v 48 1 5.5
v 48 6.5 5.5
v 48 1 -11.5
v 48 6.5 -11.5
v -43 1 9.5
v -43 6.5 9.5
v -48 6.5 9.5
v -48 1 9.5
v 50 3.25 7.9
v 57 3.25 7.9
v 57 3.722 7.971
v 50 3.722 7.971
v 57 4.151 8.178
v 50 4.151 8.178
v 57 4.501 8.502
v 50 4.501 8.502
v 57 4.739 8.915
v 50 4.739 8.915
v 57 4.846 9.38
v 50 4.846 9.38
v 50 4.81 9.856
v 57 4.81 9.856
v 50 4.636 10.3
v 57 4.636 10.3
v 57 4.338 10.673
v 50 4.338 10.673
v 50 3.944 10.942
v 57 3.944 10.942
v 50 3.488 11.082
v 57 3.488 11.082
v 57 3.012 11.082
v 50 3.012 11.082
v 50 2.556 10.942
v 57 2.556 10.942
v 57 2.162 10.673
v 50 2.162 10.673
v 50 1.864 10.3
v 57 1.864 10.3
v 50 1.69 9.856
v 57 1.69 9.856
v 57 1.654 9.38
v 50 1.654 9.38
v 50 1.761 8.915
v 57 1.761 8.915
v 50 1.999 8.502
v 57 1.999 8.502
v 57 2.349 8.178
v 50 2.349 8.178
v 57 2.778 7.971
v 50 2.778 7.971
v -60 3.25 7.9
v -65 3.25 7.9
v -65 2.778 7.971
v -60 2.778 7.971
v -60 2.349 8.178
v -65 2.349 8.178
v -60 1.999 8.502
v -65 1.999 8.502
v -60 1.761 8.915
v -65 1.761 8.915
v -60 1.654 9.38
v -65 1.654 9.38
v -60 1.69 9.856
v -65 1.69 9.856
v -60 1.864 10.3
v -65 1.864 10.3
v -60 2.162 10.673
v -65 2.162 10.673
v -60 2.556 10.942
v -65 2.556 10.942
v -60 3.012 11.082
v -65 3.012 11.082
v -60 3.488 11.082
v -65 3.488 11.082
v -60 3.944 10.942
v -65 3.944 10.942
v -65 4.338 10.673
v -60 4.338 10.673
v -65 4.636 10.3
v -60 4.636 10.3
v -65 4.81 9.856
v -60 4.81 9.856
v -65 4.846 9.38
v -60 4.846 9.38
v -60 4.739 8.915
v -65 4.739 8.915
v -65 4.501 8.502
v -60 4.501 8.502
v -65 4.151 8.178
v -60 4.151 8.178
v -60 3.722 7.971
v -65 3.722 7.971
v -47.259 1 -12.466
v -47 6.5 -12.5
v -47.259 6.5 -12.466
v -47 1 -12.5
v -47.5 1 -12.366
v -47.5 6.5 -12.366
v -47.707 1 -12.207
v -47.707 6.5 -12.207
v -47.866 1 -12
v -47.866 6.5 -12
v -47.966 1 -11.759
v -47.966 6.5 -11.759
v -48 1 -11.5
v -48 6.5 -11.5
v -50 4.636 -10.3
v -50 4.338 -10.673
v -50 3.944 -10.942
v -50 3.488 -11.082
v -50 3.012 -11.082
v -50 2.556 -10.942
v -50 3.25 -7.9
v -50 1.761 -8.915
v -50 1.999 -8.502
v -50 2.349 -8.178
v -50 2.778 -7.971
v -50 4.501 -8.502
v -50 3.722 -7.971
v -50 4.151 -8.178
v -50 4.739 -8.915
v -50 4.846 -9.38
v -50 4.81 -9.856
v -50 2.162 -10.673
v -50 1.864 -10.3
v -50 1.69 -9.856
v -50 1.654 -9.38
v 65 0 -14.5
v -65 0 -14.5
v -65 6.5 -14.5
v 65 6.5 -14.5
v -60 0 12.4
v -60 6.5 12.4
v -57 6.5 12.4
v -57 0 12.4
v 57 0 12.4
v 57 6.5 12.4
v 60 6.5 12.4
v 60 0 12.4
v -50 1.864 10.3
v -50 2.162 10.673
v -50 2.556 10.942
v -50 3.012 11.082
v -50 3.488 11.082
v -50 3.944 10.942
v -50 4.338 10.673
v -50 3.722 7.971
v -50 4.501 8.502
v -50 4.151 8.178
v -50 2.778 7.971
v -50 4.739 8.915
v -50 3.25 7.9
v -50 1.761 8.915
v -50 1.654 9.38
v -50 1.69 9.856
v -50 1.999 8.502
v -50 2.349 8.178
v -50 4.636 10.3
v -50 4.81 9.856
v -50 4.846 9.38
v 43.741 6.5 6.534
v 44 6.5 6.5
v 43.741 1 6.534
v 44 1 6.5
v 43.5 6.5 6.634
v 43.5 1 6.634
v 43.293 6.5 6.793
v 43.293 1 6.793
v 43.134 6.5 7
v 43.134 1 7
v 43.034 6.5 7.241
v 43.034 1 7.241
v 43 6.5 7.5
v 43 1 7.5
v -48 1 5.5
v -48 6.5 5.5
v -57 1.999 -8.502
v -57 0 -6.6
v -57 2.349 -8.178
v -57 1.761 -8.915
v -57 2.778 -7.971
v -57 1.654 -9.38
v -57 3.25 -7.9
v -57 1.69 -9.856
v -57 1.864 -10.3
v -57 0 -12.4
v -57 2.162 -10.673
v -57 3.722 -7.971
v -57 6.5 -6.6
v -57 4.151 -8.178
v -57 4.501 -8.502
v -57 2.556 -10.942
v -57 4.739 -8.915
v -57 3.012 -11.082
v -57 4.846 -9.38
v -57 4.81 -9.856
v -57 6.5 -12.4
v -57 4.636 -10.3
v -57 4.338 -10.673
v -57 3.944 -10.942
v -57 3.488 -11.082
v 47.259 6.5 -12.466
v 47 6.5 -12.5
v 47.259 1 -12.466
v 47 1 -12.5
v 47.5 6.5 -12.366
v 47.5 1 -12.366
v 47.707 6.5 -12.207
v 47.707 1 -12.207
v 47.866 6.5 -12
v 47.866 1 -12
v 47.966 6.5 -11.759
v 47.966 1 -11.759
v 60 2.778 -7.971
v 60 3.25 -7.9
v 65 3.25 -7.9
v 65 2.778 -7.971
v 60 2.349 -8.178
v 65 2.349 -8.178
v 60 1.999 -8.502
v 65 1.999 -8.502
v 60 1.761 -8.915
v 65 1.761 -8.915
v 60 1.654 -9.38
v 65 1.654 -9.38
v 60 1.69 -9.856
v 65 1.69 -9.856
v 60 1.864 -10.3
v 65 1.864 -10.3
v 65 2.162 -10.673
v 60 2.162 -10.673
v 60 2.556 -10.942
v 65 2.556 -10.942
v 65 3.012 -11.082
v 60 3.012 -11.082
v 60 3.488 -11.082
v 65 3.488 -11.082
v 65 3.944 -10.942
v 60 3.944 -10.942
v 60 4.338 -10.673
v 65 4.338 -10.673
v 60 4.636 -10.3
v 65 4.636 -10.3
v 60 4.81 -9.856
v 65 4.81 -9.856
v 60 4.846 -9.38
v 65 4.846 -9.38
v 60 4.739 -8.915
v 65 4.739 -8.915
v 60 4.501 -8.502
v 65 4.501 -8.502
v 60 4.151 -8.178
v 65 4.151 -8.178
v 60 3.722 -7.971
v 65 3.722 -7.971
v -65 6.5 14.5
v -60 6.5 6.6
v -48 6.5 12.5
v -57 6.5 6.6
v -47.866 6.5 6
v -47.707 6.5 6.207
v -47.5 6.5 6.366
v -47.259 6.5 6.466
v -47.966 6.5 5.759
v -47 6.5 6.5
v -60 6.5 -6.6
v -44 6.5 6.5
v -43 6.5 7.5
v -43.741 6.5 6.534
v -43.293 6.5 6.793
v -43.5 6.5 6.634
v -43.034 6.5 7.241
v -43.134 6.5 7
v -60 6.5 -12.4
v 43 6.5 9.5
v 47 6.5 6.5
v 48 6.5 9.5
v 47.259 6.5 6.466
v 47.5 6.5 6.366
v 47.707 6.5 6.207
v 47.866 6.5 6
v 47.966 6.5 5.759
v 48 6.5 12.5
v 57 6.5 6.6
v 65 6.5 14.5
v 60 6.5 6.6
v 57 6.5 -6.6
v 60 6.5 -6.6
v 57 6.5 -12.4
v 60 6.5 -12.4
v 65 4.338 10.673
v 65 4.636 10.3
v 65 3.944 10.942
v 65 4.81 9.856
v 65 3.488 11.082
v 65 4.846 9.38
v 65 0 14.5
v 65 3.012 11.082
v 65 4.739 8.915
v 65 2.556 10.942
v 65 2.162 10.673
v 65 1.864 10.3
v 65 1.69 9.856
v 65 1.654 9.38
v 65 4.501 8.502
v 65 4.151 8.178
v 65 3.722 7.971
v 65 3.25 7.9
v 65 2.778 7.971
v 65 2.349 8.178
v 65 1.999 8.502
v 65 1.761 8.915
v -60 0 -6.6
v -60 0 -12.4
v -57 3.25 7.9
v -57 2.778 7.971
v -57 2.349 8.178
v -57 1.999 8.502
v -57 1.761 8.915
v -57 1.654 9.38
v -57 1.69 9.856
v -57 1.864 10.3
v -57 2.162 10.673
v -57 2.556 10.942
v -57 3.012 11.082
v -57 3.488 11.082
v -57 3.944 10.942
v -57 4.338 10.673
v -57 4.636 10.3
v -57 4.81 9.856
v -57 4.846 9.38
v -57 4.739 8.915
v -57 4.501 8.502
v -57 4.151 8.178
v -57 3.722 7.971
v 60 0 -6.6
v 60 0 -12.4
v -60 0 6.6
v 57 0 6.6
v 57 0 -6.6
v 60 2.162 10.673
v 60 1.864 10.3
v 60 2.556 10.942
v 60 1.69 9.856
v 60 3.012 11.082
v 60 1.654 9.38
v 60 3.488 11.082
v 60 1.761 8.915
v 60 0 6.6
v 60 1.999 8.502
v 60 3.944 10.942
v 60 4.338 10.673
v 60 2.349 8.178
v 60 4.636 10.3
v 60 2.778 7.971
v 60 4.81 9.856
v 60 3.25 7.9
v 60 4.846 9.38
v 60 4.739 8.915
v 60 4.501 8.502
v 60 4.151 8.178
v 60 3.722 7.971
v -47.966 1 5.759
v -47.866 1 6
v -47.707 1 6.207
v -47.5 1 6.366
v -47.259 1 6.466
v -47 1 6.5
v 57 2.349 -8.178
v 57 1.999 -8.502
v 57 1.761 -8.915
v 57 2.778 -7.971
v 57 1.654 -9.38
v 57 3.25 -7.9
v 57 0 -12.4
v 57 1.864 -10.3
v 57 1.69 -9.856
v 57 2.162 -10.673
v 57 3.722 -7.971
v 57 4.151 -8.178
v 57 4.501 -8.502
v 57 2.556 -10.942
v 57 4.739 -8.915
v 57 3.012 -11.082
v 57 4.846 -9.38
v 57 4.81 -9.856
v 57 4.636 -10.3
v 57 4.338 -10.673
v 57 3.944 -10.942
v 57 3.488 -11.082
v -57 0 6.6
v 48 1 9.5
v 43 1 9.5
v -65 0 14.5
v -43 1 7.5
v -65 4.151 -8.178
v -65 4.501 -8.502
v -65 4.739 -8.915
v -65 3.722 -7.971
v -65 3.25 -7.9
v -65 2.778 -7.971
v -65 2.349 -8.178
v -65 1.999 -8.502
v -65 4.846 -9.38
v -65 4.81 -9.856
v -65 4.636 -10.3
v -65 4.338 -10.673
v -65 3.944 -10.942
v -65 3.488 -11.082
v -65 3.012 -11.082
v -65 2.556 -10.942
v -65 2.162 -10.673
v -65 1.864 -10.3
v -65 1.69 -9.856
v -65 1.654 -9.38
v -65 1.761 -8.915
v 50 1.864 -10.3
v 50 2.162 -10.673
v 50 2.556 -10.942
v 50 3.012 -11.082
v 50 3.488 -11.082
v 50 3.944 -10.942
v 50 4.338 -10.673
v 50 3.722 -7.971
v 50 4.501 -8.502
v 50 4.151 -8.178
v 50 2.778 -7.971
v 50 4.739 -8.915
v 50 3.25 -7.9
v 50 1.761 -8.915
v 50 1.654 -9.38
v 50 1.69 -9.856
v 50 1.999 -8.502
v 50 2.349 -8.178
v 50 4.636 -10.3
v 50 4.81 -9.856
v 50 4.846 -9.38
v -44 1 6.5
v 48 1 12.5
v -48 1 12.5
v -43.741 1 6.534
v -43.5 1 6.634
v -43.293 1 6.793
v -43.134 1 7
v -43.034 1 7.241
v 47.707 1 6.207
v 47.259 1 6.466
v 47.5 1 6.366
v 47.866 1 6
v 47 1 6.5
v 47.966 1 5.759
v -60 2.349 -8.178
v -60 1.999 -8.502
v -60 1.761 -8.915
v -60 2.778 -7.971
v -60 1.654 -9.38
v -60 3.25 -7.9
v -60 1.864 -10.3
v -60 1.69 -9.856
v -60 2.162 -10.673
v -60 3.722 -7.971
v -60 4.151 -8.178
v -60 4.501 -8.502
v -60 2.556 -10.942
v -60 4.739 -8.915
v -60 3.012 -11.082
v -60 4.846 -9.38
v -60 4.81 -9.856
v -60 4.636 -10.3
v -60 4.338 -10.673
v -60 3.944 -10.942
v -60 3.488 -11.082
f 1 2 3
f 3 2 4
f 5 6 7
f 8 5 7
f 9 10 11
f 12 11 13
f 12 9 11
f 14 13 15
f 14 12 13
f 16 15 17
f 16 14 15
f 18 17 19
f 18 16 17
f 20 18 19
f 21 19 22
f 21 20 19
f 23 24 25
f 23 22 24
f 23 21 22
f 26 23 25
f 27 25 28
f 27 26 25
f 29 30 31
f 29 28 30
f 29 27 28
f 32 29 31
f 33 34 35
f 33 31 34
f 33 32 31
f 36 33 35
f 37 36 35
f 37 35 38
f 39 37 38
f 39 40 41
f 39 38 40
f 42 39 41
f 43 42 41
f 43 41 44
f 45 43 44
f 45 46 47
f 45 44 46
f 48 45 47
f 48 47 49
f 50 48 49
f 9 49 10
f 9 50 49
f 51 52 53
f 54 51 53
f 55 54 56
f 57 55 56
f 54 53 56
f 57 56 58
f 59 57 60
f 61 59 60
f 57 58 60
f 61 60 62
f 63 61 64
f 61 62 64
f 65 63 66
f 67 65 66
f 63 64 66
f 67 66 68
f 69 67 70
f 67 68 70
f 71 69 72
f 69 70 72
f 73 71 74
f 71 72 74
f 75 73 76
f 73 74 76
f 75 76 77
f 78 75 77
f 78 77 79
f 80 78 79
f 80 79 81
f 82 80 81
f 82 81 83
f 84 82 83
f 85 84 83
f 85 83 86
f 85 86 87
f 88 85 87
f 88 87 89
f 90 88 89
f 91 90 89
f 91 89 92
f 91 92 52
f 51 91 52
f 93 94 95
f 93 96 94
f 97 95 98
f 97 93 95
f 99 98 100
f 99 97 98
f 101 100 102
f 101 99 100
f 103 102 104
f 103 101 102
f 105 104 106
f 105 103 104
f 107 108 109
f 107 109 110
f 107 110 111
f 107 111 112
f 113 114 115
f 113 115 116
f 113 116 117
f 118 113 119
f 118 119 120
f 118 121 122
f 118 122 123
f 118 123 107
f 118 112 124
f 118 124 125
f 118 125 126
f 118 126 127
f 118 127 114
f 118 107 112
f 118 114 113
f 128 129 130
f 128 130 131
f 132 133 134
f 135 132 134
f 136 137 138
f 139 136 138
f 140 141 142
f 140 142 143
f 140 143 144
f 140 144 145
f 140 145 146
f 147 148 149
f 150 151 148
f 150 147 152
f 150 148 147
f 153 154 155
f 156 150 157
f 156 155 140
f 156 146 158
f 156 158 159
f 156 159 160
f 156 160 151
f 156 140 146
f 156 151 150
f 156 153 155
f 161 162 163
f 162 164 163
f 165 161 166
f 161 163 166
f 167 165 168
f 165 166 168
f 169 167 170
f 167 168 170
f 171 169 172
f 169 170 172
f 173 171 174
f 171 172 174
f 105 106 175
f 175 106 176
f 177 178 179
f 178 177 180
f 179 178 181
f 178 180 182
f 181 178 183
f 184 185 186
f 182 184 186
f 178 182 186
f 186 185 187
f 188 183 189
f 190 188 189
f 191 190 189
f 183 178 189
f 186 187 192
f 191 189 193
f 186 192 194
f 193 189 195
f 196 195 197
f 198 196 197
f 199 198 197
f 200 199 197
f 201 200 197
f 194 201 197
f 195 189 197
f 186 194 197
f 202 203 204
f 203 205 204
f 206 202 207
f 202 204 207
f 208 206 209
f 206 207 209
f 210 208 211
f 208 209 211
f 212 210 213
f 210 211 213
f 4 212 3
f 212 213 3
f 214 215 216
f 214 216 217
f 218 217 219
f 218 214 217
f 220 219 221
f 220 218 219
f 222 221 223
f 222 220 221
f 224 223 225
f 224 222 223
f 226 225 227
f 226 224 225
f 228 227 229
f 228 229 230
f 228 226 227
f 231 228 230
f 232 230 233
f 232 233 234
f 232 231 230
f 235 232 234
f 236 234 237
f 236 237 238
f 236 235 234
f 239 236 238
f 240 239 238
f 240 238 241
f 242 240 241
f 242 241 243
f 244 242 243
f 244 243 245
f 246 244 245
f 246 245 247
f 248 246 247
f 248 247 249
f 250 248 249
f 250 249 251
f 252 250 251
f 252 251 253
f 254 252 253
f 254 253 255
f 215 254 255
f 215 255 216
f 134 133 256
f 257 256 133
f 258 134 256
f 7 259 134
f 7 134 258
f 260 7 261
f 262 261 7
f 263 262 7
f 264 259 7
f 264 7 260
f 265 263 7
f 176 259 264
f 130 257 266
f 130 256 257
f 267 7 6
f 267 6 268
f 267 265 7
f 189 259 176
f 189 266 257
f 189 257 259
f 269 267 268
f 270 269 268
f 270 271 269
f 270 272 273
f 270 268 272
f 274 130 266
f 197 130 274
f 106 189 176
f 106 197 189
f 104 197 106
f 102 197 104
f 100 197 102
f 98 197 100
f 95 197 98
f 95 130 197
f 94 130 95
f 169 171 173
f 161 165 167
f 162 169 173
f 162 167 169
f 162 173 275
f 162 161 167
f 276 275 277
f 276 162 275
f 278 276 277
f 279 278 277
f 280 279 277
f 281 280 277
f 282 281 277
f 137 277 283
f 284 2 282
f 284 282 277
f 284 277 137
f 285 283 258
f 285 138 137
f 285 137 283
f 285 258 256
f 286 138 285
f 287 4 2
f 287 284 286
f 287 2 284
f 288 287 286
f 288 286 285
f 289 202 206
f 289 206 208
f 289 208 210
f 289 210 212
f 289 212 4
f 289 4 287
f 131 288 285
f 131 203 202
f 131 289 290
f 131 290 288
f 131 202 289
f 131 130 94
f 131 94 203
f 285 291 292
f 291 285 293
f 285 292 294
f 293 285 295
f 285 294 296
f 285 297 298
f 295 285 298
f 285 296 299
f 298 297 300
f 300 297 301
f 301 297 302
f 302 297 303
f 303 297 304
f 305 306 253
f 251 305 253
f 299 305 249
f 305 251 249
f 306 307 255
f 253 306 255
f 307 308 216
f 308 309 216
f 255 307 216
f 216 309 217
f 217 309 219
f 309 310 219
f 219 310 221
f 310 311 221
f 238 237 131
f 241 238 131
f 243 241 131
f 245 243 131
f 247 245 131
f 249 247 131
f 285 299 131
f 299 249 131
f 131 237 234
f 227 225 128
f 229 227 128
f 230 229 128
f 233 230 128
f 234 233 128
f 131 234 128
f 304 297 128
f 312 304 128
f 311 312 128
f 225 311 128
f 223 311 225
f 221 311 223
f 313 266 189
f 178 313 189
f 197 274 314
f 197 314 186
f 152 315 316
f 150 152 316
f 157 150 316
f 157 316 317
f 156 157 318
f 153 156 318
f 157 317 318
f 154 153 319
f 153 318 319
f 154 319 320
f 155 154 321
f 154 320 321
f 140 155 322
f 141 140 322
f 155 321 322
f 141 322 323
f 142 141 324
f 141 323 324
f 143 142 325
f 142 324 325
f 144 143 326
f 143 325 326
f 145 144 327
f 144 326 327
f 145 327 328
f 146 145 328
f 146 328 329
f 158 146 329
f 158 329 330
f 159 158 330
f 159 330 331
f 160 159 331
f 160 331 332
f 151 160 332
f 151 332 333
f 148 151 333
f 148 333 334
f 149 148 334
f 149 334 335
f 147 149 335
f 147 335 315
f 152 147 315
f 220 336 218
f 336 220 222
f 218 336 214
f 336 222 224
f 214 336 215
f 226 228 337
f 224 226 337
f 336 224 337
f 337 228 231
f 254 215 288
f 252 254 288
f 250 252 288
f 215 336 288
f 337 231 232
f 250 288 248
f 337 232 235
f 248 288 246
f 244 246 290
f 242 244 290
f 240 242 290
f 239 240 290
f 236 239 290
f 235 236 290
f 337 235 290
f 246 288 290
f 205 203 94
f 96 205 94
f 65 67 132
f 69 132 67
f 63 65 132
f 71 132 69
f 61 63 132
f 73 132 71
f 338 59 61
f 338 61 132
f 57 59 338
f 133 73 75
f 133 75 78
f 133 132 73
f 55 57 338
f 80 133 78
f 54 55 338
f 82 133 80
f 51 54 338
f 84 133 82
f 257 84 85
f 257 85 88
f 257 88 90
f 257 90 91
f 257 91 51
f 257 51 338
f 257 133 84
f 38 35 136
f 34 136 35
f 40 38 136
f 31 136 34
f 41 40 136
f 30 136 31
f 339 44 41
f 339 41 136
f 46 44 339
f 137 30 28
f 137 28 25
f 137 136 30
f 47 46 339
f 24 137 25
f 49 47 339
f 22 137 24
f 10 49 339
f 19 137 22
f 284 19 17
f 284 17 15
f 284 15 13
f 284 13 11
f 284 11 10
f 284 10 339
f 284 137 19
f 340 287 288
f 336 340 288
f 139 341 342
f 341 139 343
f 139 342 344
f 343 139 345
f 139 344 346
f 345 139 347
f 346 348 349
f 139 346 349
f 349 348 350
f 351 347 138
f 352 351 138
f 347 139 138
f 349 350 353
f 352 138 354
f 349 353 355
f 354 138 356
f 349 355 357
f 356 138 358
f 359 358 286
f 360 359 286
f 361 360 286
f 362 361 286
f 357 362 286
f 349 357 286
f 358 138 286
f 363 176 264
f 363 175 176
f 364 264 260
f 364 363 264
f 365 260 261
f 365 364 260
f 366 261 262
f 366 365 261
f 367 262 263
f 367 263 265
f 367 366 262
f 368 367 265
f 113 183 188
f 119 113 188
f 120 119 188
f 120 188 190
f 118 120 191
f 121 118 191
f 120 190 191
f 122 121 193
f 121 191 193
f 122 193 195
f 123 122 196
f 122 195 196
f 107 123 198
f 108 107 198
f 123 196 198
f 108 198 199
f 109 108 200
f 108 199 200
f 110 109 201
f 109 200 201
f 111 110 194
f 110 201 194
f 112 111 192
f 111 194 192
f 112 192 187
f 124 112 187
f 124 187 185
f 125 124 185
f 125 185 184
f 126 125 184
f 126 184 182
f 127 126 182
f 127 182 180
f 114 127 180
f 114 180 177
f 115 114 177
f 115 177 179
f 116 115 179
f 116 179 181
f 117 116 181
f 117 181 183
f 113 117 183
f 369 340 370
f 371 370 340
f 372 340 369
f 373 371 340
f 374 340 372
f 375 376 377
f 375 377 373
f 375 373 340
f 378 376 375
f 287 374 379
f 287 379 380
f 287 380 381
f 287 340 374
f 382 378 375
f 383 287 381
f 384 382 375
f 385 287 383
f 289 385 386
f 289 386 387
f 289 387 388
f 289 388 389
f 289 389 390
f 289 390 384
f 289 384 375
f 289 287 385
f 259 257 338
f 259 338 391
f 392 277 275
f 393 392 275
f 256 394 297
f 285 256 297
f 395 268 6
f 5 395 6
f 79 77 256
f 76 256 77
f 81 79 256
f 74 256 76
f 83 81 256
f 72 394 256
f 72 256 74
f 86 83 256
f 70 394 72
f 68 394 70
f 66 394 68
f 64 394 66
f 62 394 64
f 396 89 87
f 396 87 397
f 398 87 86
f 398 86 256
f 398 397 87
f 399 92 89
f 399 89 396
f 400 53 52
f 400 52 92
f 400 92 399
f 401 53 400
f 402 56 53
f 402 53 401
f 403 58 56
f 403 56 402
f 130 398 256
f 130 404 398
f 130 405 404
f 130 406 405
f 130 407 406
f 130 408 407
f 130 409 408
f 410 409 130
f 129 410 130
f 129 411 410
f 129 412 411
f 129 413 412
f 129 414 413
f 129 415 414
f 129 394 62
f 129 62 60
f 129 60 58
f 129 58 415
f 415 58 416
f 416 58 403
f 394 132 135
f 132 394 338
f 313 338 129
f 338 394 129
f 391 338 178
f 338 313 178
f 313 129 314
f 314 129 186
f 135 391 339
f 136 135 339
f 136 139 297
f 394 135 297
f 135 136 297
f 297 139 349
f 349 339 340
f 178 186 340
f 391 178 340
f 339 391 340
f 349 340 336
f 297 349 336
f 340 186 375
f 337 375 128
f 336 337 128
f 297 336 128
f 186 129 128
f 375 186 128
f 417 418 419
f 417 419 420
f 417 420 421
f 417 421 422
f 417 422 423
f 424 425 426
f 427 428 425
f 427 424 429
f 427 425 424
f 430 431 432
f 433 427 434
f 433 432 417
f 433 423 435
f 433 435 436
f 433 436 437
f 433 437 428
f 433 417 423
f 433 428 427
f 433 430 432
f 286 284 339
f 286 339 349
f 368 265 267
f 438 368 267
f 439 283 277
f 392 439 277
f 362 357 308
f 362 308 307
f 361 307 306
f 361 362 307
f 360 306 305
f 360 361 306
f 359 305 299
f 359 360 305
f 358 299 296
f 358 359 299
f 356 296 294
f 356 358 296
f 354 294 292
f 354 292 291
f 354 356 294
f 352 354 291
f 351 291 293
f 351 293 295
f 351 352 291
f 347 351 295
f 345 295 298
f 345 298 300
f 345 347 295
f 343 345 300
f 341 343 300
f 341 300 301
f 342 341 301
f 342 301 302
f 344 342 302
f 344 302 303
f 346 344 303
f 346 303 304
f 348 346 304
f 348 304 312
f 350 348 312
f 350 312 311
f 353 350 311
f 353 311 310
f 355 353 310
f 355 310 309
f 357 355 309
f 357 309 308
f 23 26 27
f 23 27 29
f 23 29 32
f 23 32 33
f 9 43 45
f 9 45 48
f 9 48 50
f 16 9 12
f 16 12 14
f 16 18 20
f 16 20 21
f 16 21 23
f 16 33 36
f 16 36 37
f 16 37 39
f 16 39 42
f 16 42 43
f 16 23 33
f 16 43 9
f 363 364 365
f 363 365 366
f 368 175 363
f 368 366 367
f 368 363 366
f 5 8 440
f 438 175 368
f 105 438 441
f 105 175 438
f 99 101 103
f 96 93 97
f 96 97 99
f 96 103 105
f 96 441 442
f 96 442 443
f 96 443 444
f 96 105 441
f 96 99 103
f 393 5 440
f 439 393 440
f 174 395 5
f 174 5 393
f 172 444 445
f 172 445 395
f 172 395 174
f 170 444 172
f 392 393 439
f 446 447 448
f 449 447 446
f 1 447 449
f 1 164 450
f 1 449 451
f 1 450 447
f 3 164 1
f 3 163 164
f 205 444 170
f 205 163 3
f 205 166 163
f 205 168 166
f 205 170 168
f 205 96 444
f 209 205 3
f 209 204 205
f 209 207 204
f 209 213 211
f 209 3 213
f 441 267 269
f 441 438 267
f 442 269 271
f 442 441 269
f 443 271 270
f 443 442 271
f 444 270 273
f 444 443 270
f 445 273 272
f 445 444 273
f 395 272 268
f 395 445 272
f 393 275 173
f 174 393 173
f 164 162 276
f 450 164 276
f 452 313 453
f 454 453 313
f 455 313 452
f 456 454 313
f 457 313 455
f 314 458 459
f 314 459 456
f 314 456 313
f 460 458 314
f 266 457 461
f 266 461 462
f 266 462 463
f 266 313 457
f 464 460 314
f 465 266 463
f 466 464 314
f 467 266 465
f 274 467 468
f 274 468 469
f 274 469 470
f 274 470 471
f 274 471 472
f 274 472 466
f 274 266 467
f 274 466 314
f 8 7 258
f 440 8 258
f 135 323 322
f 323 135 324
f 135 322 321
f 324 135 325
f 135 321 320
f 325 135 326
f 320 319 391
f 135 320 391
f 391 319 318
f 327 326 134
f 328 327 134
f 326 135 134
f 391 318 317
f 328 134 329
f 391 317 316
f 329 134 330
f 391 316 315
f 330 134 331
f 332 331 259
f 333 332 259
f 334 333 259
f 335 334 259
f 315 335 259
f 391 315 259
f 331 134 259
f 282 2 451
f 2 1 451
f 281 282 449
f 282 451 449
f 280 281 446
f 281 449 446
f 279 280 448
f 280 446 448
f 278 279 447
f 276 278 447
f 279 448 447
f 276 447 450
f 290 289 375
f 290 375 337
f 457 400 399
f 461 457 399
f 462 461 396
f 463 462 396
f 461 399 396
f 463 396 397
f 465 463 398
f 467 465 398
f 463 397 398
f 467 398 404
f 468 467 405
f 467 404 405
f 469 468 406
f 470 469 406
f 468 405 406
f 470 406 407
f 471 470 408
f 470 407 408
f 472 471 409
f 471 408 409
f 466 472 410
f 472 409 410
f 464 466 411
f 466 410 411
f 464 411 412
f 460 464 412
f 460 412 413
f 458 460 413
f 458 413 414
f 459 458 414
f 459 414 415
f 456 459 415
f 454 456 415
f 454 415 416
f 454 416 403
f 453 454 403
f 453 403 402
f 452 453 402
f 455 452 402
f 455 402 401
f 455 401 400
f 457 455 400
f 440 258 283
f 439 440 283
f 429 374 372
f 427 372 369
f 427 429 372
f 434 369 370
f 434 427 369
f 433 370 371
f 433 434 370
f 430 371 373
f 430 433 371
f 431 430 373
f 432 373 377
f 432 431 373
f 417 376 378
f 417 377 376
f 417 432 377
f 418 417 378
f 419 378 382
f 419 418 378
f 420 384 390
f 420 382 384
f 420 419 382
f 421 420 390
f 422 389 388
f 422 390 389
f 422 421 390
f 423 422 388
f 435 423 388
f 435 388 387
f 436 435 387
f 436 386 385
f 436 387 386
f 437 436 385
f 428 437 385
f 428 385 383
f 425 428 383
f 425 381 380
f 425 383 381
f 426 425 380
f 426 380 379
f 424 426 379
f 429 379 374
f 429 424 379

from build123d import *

# Parameters (mm, degrees)
CROQUIS1_W              = 130
CROQUIS1_H              = 29
SALIENTE_EXTRUIR1_DEPTH = 6.5
CORTAR_EXTRUIR1_DEPTH   = 5.5
CROQUIS3_W              = 3
CROQUIS3_H              = 5.8
CORTAR_EXTRUIR2_DEPTH   = 67.91412407
CROQUIS4_R              = 1.6
CORTAR_EXTRUIR3_DEPTH   = 15
CORTAR_EXTRUIR4_START   = -15
CROQUIS5_R              = 1.6
CORTAR_EXTRUIR4_DEPTH   = 15
REDONDEO1_R             = 1


with BuildPart() as part:
    # Croquis1 → Saliente-Extruir1 (new body)
    with BuildSketch(Plane(origin=(0, 0, 0), x_dir=(1, 0, 0), z_dir=(0, 1, 0))):
        Rectangle(CROQUIS1_W, CROQUIS1_H)
    extrude(amount=SALIENTE_EXTRUIR1_DEPTH)

    # Croquis2 → Cortar-Extruir1 (cut)
    with BuildSketch(Plane(origin=(0, 6.5, 0), x_dir=(1, 0, 0), z_dir=(0, 1, 0))):
        Polygon((48, 12.5), (-48, 12.5), (-48, -6.5), (-43, -6.5), (-43, -9.5), (-48, -9.5), (-48, -12.5), (48, -12.5), (48, -9.5), (43, -9.5), (43, -6.5), (48, -6.5), align=None)
    extrude(amount=-CORTAR_EXTRUIR1_DEPTH, mode=Mode.SUBTRACT)

    # Croquis3 → Cortar-Extruir2 (cut, through all)
    with BuildSketch(Plane(origin=(0, 6.5, 0), x_dir=(1, 0, 0), z_dir=(0, 1, 0))):
        with Locations((-58.5, -9.5)):
            Rectangle(CROQUIS3_W, CROQUIS3_H)
        with Locations((-58.5, 9.5)):
            Rectangle(CROQUIS3_W, CROQUIS3_H)
        with Locations((58.5, -9.5)):
            Rectangle(CROQUIS3_W, CROQUIS3_H)
        with Locations((58.5, 9.5)):
            Rectangle(CROQUIS3_W, CROQUIS3_H)
    extrude(amount=-CORTAR_EXTRUIR2_DEPTH, mode=Mode.SUBTRACT)

    # Croquis4 → Cortar-Extruir3 (cut)
    with BuildSketch(Plane.ZY.offset(65)):
        with Locations((-9.5, 3.25)):
            Circle(CROQUIS4_R)
        with Locations(Location((9.5, 3.25, 0), (0, 0, 180))):
            Circle(CROQUIS4_R)
    extrude(amount=-CORTAR_EXTRUIR3_DEPTH, mode=Mode.SUBTRACT)

    # Croquis5 → Cortar-Extruir4 (cut)
    with BuildSketch(Plane(origin=(65, 0, 0), x_dir=(0, 0, -1), z_dir=(1, 0, 0)).offset(CORTAR_EXTRUIR4_START)):
        with Locations((-9.5, 3.25)):
            Circle(CROQUIS5_R)
        with Locations(Location((9.5, 3.25, 0), (0, 0, 180))):
            Circle(CROQUIS5_R)
    extrude(amount=CORTAR_EXTRUIR4_DEPTH, mode=Mode.SUBTRACT)

    # Redondeo1
    redondeo1_edges = [part.edges().sort_by_distance(p)[0] for p in [
        (-48, 3.75, 6.5),
        (-48, 3.75, -12.5),
        (48, 3.75, -12.5),
        (48, 3.75, 6.5),
        (43, 3.75, 6.5),
        (-43, 3.75, 6.5),
    ]]
    fillet(redondeo1_edges, radius=REDONDEO1_R)


solid = part.part
